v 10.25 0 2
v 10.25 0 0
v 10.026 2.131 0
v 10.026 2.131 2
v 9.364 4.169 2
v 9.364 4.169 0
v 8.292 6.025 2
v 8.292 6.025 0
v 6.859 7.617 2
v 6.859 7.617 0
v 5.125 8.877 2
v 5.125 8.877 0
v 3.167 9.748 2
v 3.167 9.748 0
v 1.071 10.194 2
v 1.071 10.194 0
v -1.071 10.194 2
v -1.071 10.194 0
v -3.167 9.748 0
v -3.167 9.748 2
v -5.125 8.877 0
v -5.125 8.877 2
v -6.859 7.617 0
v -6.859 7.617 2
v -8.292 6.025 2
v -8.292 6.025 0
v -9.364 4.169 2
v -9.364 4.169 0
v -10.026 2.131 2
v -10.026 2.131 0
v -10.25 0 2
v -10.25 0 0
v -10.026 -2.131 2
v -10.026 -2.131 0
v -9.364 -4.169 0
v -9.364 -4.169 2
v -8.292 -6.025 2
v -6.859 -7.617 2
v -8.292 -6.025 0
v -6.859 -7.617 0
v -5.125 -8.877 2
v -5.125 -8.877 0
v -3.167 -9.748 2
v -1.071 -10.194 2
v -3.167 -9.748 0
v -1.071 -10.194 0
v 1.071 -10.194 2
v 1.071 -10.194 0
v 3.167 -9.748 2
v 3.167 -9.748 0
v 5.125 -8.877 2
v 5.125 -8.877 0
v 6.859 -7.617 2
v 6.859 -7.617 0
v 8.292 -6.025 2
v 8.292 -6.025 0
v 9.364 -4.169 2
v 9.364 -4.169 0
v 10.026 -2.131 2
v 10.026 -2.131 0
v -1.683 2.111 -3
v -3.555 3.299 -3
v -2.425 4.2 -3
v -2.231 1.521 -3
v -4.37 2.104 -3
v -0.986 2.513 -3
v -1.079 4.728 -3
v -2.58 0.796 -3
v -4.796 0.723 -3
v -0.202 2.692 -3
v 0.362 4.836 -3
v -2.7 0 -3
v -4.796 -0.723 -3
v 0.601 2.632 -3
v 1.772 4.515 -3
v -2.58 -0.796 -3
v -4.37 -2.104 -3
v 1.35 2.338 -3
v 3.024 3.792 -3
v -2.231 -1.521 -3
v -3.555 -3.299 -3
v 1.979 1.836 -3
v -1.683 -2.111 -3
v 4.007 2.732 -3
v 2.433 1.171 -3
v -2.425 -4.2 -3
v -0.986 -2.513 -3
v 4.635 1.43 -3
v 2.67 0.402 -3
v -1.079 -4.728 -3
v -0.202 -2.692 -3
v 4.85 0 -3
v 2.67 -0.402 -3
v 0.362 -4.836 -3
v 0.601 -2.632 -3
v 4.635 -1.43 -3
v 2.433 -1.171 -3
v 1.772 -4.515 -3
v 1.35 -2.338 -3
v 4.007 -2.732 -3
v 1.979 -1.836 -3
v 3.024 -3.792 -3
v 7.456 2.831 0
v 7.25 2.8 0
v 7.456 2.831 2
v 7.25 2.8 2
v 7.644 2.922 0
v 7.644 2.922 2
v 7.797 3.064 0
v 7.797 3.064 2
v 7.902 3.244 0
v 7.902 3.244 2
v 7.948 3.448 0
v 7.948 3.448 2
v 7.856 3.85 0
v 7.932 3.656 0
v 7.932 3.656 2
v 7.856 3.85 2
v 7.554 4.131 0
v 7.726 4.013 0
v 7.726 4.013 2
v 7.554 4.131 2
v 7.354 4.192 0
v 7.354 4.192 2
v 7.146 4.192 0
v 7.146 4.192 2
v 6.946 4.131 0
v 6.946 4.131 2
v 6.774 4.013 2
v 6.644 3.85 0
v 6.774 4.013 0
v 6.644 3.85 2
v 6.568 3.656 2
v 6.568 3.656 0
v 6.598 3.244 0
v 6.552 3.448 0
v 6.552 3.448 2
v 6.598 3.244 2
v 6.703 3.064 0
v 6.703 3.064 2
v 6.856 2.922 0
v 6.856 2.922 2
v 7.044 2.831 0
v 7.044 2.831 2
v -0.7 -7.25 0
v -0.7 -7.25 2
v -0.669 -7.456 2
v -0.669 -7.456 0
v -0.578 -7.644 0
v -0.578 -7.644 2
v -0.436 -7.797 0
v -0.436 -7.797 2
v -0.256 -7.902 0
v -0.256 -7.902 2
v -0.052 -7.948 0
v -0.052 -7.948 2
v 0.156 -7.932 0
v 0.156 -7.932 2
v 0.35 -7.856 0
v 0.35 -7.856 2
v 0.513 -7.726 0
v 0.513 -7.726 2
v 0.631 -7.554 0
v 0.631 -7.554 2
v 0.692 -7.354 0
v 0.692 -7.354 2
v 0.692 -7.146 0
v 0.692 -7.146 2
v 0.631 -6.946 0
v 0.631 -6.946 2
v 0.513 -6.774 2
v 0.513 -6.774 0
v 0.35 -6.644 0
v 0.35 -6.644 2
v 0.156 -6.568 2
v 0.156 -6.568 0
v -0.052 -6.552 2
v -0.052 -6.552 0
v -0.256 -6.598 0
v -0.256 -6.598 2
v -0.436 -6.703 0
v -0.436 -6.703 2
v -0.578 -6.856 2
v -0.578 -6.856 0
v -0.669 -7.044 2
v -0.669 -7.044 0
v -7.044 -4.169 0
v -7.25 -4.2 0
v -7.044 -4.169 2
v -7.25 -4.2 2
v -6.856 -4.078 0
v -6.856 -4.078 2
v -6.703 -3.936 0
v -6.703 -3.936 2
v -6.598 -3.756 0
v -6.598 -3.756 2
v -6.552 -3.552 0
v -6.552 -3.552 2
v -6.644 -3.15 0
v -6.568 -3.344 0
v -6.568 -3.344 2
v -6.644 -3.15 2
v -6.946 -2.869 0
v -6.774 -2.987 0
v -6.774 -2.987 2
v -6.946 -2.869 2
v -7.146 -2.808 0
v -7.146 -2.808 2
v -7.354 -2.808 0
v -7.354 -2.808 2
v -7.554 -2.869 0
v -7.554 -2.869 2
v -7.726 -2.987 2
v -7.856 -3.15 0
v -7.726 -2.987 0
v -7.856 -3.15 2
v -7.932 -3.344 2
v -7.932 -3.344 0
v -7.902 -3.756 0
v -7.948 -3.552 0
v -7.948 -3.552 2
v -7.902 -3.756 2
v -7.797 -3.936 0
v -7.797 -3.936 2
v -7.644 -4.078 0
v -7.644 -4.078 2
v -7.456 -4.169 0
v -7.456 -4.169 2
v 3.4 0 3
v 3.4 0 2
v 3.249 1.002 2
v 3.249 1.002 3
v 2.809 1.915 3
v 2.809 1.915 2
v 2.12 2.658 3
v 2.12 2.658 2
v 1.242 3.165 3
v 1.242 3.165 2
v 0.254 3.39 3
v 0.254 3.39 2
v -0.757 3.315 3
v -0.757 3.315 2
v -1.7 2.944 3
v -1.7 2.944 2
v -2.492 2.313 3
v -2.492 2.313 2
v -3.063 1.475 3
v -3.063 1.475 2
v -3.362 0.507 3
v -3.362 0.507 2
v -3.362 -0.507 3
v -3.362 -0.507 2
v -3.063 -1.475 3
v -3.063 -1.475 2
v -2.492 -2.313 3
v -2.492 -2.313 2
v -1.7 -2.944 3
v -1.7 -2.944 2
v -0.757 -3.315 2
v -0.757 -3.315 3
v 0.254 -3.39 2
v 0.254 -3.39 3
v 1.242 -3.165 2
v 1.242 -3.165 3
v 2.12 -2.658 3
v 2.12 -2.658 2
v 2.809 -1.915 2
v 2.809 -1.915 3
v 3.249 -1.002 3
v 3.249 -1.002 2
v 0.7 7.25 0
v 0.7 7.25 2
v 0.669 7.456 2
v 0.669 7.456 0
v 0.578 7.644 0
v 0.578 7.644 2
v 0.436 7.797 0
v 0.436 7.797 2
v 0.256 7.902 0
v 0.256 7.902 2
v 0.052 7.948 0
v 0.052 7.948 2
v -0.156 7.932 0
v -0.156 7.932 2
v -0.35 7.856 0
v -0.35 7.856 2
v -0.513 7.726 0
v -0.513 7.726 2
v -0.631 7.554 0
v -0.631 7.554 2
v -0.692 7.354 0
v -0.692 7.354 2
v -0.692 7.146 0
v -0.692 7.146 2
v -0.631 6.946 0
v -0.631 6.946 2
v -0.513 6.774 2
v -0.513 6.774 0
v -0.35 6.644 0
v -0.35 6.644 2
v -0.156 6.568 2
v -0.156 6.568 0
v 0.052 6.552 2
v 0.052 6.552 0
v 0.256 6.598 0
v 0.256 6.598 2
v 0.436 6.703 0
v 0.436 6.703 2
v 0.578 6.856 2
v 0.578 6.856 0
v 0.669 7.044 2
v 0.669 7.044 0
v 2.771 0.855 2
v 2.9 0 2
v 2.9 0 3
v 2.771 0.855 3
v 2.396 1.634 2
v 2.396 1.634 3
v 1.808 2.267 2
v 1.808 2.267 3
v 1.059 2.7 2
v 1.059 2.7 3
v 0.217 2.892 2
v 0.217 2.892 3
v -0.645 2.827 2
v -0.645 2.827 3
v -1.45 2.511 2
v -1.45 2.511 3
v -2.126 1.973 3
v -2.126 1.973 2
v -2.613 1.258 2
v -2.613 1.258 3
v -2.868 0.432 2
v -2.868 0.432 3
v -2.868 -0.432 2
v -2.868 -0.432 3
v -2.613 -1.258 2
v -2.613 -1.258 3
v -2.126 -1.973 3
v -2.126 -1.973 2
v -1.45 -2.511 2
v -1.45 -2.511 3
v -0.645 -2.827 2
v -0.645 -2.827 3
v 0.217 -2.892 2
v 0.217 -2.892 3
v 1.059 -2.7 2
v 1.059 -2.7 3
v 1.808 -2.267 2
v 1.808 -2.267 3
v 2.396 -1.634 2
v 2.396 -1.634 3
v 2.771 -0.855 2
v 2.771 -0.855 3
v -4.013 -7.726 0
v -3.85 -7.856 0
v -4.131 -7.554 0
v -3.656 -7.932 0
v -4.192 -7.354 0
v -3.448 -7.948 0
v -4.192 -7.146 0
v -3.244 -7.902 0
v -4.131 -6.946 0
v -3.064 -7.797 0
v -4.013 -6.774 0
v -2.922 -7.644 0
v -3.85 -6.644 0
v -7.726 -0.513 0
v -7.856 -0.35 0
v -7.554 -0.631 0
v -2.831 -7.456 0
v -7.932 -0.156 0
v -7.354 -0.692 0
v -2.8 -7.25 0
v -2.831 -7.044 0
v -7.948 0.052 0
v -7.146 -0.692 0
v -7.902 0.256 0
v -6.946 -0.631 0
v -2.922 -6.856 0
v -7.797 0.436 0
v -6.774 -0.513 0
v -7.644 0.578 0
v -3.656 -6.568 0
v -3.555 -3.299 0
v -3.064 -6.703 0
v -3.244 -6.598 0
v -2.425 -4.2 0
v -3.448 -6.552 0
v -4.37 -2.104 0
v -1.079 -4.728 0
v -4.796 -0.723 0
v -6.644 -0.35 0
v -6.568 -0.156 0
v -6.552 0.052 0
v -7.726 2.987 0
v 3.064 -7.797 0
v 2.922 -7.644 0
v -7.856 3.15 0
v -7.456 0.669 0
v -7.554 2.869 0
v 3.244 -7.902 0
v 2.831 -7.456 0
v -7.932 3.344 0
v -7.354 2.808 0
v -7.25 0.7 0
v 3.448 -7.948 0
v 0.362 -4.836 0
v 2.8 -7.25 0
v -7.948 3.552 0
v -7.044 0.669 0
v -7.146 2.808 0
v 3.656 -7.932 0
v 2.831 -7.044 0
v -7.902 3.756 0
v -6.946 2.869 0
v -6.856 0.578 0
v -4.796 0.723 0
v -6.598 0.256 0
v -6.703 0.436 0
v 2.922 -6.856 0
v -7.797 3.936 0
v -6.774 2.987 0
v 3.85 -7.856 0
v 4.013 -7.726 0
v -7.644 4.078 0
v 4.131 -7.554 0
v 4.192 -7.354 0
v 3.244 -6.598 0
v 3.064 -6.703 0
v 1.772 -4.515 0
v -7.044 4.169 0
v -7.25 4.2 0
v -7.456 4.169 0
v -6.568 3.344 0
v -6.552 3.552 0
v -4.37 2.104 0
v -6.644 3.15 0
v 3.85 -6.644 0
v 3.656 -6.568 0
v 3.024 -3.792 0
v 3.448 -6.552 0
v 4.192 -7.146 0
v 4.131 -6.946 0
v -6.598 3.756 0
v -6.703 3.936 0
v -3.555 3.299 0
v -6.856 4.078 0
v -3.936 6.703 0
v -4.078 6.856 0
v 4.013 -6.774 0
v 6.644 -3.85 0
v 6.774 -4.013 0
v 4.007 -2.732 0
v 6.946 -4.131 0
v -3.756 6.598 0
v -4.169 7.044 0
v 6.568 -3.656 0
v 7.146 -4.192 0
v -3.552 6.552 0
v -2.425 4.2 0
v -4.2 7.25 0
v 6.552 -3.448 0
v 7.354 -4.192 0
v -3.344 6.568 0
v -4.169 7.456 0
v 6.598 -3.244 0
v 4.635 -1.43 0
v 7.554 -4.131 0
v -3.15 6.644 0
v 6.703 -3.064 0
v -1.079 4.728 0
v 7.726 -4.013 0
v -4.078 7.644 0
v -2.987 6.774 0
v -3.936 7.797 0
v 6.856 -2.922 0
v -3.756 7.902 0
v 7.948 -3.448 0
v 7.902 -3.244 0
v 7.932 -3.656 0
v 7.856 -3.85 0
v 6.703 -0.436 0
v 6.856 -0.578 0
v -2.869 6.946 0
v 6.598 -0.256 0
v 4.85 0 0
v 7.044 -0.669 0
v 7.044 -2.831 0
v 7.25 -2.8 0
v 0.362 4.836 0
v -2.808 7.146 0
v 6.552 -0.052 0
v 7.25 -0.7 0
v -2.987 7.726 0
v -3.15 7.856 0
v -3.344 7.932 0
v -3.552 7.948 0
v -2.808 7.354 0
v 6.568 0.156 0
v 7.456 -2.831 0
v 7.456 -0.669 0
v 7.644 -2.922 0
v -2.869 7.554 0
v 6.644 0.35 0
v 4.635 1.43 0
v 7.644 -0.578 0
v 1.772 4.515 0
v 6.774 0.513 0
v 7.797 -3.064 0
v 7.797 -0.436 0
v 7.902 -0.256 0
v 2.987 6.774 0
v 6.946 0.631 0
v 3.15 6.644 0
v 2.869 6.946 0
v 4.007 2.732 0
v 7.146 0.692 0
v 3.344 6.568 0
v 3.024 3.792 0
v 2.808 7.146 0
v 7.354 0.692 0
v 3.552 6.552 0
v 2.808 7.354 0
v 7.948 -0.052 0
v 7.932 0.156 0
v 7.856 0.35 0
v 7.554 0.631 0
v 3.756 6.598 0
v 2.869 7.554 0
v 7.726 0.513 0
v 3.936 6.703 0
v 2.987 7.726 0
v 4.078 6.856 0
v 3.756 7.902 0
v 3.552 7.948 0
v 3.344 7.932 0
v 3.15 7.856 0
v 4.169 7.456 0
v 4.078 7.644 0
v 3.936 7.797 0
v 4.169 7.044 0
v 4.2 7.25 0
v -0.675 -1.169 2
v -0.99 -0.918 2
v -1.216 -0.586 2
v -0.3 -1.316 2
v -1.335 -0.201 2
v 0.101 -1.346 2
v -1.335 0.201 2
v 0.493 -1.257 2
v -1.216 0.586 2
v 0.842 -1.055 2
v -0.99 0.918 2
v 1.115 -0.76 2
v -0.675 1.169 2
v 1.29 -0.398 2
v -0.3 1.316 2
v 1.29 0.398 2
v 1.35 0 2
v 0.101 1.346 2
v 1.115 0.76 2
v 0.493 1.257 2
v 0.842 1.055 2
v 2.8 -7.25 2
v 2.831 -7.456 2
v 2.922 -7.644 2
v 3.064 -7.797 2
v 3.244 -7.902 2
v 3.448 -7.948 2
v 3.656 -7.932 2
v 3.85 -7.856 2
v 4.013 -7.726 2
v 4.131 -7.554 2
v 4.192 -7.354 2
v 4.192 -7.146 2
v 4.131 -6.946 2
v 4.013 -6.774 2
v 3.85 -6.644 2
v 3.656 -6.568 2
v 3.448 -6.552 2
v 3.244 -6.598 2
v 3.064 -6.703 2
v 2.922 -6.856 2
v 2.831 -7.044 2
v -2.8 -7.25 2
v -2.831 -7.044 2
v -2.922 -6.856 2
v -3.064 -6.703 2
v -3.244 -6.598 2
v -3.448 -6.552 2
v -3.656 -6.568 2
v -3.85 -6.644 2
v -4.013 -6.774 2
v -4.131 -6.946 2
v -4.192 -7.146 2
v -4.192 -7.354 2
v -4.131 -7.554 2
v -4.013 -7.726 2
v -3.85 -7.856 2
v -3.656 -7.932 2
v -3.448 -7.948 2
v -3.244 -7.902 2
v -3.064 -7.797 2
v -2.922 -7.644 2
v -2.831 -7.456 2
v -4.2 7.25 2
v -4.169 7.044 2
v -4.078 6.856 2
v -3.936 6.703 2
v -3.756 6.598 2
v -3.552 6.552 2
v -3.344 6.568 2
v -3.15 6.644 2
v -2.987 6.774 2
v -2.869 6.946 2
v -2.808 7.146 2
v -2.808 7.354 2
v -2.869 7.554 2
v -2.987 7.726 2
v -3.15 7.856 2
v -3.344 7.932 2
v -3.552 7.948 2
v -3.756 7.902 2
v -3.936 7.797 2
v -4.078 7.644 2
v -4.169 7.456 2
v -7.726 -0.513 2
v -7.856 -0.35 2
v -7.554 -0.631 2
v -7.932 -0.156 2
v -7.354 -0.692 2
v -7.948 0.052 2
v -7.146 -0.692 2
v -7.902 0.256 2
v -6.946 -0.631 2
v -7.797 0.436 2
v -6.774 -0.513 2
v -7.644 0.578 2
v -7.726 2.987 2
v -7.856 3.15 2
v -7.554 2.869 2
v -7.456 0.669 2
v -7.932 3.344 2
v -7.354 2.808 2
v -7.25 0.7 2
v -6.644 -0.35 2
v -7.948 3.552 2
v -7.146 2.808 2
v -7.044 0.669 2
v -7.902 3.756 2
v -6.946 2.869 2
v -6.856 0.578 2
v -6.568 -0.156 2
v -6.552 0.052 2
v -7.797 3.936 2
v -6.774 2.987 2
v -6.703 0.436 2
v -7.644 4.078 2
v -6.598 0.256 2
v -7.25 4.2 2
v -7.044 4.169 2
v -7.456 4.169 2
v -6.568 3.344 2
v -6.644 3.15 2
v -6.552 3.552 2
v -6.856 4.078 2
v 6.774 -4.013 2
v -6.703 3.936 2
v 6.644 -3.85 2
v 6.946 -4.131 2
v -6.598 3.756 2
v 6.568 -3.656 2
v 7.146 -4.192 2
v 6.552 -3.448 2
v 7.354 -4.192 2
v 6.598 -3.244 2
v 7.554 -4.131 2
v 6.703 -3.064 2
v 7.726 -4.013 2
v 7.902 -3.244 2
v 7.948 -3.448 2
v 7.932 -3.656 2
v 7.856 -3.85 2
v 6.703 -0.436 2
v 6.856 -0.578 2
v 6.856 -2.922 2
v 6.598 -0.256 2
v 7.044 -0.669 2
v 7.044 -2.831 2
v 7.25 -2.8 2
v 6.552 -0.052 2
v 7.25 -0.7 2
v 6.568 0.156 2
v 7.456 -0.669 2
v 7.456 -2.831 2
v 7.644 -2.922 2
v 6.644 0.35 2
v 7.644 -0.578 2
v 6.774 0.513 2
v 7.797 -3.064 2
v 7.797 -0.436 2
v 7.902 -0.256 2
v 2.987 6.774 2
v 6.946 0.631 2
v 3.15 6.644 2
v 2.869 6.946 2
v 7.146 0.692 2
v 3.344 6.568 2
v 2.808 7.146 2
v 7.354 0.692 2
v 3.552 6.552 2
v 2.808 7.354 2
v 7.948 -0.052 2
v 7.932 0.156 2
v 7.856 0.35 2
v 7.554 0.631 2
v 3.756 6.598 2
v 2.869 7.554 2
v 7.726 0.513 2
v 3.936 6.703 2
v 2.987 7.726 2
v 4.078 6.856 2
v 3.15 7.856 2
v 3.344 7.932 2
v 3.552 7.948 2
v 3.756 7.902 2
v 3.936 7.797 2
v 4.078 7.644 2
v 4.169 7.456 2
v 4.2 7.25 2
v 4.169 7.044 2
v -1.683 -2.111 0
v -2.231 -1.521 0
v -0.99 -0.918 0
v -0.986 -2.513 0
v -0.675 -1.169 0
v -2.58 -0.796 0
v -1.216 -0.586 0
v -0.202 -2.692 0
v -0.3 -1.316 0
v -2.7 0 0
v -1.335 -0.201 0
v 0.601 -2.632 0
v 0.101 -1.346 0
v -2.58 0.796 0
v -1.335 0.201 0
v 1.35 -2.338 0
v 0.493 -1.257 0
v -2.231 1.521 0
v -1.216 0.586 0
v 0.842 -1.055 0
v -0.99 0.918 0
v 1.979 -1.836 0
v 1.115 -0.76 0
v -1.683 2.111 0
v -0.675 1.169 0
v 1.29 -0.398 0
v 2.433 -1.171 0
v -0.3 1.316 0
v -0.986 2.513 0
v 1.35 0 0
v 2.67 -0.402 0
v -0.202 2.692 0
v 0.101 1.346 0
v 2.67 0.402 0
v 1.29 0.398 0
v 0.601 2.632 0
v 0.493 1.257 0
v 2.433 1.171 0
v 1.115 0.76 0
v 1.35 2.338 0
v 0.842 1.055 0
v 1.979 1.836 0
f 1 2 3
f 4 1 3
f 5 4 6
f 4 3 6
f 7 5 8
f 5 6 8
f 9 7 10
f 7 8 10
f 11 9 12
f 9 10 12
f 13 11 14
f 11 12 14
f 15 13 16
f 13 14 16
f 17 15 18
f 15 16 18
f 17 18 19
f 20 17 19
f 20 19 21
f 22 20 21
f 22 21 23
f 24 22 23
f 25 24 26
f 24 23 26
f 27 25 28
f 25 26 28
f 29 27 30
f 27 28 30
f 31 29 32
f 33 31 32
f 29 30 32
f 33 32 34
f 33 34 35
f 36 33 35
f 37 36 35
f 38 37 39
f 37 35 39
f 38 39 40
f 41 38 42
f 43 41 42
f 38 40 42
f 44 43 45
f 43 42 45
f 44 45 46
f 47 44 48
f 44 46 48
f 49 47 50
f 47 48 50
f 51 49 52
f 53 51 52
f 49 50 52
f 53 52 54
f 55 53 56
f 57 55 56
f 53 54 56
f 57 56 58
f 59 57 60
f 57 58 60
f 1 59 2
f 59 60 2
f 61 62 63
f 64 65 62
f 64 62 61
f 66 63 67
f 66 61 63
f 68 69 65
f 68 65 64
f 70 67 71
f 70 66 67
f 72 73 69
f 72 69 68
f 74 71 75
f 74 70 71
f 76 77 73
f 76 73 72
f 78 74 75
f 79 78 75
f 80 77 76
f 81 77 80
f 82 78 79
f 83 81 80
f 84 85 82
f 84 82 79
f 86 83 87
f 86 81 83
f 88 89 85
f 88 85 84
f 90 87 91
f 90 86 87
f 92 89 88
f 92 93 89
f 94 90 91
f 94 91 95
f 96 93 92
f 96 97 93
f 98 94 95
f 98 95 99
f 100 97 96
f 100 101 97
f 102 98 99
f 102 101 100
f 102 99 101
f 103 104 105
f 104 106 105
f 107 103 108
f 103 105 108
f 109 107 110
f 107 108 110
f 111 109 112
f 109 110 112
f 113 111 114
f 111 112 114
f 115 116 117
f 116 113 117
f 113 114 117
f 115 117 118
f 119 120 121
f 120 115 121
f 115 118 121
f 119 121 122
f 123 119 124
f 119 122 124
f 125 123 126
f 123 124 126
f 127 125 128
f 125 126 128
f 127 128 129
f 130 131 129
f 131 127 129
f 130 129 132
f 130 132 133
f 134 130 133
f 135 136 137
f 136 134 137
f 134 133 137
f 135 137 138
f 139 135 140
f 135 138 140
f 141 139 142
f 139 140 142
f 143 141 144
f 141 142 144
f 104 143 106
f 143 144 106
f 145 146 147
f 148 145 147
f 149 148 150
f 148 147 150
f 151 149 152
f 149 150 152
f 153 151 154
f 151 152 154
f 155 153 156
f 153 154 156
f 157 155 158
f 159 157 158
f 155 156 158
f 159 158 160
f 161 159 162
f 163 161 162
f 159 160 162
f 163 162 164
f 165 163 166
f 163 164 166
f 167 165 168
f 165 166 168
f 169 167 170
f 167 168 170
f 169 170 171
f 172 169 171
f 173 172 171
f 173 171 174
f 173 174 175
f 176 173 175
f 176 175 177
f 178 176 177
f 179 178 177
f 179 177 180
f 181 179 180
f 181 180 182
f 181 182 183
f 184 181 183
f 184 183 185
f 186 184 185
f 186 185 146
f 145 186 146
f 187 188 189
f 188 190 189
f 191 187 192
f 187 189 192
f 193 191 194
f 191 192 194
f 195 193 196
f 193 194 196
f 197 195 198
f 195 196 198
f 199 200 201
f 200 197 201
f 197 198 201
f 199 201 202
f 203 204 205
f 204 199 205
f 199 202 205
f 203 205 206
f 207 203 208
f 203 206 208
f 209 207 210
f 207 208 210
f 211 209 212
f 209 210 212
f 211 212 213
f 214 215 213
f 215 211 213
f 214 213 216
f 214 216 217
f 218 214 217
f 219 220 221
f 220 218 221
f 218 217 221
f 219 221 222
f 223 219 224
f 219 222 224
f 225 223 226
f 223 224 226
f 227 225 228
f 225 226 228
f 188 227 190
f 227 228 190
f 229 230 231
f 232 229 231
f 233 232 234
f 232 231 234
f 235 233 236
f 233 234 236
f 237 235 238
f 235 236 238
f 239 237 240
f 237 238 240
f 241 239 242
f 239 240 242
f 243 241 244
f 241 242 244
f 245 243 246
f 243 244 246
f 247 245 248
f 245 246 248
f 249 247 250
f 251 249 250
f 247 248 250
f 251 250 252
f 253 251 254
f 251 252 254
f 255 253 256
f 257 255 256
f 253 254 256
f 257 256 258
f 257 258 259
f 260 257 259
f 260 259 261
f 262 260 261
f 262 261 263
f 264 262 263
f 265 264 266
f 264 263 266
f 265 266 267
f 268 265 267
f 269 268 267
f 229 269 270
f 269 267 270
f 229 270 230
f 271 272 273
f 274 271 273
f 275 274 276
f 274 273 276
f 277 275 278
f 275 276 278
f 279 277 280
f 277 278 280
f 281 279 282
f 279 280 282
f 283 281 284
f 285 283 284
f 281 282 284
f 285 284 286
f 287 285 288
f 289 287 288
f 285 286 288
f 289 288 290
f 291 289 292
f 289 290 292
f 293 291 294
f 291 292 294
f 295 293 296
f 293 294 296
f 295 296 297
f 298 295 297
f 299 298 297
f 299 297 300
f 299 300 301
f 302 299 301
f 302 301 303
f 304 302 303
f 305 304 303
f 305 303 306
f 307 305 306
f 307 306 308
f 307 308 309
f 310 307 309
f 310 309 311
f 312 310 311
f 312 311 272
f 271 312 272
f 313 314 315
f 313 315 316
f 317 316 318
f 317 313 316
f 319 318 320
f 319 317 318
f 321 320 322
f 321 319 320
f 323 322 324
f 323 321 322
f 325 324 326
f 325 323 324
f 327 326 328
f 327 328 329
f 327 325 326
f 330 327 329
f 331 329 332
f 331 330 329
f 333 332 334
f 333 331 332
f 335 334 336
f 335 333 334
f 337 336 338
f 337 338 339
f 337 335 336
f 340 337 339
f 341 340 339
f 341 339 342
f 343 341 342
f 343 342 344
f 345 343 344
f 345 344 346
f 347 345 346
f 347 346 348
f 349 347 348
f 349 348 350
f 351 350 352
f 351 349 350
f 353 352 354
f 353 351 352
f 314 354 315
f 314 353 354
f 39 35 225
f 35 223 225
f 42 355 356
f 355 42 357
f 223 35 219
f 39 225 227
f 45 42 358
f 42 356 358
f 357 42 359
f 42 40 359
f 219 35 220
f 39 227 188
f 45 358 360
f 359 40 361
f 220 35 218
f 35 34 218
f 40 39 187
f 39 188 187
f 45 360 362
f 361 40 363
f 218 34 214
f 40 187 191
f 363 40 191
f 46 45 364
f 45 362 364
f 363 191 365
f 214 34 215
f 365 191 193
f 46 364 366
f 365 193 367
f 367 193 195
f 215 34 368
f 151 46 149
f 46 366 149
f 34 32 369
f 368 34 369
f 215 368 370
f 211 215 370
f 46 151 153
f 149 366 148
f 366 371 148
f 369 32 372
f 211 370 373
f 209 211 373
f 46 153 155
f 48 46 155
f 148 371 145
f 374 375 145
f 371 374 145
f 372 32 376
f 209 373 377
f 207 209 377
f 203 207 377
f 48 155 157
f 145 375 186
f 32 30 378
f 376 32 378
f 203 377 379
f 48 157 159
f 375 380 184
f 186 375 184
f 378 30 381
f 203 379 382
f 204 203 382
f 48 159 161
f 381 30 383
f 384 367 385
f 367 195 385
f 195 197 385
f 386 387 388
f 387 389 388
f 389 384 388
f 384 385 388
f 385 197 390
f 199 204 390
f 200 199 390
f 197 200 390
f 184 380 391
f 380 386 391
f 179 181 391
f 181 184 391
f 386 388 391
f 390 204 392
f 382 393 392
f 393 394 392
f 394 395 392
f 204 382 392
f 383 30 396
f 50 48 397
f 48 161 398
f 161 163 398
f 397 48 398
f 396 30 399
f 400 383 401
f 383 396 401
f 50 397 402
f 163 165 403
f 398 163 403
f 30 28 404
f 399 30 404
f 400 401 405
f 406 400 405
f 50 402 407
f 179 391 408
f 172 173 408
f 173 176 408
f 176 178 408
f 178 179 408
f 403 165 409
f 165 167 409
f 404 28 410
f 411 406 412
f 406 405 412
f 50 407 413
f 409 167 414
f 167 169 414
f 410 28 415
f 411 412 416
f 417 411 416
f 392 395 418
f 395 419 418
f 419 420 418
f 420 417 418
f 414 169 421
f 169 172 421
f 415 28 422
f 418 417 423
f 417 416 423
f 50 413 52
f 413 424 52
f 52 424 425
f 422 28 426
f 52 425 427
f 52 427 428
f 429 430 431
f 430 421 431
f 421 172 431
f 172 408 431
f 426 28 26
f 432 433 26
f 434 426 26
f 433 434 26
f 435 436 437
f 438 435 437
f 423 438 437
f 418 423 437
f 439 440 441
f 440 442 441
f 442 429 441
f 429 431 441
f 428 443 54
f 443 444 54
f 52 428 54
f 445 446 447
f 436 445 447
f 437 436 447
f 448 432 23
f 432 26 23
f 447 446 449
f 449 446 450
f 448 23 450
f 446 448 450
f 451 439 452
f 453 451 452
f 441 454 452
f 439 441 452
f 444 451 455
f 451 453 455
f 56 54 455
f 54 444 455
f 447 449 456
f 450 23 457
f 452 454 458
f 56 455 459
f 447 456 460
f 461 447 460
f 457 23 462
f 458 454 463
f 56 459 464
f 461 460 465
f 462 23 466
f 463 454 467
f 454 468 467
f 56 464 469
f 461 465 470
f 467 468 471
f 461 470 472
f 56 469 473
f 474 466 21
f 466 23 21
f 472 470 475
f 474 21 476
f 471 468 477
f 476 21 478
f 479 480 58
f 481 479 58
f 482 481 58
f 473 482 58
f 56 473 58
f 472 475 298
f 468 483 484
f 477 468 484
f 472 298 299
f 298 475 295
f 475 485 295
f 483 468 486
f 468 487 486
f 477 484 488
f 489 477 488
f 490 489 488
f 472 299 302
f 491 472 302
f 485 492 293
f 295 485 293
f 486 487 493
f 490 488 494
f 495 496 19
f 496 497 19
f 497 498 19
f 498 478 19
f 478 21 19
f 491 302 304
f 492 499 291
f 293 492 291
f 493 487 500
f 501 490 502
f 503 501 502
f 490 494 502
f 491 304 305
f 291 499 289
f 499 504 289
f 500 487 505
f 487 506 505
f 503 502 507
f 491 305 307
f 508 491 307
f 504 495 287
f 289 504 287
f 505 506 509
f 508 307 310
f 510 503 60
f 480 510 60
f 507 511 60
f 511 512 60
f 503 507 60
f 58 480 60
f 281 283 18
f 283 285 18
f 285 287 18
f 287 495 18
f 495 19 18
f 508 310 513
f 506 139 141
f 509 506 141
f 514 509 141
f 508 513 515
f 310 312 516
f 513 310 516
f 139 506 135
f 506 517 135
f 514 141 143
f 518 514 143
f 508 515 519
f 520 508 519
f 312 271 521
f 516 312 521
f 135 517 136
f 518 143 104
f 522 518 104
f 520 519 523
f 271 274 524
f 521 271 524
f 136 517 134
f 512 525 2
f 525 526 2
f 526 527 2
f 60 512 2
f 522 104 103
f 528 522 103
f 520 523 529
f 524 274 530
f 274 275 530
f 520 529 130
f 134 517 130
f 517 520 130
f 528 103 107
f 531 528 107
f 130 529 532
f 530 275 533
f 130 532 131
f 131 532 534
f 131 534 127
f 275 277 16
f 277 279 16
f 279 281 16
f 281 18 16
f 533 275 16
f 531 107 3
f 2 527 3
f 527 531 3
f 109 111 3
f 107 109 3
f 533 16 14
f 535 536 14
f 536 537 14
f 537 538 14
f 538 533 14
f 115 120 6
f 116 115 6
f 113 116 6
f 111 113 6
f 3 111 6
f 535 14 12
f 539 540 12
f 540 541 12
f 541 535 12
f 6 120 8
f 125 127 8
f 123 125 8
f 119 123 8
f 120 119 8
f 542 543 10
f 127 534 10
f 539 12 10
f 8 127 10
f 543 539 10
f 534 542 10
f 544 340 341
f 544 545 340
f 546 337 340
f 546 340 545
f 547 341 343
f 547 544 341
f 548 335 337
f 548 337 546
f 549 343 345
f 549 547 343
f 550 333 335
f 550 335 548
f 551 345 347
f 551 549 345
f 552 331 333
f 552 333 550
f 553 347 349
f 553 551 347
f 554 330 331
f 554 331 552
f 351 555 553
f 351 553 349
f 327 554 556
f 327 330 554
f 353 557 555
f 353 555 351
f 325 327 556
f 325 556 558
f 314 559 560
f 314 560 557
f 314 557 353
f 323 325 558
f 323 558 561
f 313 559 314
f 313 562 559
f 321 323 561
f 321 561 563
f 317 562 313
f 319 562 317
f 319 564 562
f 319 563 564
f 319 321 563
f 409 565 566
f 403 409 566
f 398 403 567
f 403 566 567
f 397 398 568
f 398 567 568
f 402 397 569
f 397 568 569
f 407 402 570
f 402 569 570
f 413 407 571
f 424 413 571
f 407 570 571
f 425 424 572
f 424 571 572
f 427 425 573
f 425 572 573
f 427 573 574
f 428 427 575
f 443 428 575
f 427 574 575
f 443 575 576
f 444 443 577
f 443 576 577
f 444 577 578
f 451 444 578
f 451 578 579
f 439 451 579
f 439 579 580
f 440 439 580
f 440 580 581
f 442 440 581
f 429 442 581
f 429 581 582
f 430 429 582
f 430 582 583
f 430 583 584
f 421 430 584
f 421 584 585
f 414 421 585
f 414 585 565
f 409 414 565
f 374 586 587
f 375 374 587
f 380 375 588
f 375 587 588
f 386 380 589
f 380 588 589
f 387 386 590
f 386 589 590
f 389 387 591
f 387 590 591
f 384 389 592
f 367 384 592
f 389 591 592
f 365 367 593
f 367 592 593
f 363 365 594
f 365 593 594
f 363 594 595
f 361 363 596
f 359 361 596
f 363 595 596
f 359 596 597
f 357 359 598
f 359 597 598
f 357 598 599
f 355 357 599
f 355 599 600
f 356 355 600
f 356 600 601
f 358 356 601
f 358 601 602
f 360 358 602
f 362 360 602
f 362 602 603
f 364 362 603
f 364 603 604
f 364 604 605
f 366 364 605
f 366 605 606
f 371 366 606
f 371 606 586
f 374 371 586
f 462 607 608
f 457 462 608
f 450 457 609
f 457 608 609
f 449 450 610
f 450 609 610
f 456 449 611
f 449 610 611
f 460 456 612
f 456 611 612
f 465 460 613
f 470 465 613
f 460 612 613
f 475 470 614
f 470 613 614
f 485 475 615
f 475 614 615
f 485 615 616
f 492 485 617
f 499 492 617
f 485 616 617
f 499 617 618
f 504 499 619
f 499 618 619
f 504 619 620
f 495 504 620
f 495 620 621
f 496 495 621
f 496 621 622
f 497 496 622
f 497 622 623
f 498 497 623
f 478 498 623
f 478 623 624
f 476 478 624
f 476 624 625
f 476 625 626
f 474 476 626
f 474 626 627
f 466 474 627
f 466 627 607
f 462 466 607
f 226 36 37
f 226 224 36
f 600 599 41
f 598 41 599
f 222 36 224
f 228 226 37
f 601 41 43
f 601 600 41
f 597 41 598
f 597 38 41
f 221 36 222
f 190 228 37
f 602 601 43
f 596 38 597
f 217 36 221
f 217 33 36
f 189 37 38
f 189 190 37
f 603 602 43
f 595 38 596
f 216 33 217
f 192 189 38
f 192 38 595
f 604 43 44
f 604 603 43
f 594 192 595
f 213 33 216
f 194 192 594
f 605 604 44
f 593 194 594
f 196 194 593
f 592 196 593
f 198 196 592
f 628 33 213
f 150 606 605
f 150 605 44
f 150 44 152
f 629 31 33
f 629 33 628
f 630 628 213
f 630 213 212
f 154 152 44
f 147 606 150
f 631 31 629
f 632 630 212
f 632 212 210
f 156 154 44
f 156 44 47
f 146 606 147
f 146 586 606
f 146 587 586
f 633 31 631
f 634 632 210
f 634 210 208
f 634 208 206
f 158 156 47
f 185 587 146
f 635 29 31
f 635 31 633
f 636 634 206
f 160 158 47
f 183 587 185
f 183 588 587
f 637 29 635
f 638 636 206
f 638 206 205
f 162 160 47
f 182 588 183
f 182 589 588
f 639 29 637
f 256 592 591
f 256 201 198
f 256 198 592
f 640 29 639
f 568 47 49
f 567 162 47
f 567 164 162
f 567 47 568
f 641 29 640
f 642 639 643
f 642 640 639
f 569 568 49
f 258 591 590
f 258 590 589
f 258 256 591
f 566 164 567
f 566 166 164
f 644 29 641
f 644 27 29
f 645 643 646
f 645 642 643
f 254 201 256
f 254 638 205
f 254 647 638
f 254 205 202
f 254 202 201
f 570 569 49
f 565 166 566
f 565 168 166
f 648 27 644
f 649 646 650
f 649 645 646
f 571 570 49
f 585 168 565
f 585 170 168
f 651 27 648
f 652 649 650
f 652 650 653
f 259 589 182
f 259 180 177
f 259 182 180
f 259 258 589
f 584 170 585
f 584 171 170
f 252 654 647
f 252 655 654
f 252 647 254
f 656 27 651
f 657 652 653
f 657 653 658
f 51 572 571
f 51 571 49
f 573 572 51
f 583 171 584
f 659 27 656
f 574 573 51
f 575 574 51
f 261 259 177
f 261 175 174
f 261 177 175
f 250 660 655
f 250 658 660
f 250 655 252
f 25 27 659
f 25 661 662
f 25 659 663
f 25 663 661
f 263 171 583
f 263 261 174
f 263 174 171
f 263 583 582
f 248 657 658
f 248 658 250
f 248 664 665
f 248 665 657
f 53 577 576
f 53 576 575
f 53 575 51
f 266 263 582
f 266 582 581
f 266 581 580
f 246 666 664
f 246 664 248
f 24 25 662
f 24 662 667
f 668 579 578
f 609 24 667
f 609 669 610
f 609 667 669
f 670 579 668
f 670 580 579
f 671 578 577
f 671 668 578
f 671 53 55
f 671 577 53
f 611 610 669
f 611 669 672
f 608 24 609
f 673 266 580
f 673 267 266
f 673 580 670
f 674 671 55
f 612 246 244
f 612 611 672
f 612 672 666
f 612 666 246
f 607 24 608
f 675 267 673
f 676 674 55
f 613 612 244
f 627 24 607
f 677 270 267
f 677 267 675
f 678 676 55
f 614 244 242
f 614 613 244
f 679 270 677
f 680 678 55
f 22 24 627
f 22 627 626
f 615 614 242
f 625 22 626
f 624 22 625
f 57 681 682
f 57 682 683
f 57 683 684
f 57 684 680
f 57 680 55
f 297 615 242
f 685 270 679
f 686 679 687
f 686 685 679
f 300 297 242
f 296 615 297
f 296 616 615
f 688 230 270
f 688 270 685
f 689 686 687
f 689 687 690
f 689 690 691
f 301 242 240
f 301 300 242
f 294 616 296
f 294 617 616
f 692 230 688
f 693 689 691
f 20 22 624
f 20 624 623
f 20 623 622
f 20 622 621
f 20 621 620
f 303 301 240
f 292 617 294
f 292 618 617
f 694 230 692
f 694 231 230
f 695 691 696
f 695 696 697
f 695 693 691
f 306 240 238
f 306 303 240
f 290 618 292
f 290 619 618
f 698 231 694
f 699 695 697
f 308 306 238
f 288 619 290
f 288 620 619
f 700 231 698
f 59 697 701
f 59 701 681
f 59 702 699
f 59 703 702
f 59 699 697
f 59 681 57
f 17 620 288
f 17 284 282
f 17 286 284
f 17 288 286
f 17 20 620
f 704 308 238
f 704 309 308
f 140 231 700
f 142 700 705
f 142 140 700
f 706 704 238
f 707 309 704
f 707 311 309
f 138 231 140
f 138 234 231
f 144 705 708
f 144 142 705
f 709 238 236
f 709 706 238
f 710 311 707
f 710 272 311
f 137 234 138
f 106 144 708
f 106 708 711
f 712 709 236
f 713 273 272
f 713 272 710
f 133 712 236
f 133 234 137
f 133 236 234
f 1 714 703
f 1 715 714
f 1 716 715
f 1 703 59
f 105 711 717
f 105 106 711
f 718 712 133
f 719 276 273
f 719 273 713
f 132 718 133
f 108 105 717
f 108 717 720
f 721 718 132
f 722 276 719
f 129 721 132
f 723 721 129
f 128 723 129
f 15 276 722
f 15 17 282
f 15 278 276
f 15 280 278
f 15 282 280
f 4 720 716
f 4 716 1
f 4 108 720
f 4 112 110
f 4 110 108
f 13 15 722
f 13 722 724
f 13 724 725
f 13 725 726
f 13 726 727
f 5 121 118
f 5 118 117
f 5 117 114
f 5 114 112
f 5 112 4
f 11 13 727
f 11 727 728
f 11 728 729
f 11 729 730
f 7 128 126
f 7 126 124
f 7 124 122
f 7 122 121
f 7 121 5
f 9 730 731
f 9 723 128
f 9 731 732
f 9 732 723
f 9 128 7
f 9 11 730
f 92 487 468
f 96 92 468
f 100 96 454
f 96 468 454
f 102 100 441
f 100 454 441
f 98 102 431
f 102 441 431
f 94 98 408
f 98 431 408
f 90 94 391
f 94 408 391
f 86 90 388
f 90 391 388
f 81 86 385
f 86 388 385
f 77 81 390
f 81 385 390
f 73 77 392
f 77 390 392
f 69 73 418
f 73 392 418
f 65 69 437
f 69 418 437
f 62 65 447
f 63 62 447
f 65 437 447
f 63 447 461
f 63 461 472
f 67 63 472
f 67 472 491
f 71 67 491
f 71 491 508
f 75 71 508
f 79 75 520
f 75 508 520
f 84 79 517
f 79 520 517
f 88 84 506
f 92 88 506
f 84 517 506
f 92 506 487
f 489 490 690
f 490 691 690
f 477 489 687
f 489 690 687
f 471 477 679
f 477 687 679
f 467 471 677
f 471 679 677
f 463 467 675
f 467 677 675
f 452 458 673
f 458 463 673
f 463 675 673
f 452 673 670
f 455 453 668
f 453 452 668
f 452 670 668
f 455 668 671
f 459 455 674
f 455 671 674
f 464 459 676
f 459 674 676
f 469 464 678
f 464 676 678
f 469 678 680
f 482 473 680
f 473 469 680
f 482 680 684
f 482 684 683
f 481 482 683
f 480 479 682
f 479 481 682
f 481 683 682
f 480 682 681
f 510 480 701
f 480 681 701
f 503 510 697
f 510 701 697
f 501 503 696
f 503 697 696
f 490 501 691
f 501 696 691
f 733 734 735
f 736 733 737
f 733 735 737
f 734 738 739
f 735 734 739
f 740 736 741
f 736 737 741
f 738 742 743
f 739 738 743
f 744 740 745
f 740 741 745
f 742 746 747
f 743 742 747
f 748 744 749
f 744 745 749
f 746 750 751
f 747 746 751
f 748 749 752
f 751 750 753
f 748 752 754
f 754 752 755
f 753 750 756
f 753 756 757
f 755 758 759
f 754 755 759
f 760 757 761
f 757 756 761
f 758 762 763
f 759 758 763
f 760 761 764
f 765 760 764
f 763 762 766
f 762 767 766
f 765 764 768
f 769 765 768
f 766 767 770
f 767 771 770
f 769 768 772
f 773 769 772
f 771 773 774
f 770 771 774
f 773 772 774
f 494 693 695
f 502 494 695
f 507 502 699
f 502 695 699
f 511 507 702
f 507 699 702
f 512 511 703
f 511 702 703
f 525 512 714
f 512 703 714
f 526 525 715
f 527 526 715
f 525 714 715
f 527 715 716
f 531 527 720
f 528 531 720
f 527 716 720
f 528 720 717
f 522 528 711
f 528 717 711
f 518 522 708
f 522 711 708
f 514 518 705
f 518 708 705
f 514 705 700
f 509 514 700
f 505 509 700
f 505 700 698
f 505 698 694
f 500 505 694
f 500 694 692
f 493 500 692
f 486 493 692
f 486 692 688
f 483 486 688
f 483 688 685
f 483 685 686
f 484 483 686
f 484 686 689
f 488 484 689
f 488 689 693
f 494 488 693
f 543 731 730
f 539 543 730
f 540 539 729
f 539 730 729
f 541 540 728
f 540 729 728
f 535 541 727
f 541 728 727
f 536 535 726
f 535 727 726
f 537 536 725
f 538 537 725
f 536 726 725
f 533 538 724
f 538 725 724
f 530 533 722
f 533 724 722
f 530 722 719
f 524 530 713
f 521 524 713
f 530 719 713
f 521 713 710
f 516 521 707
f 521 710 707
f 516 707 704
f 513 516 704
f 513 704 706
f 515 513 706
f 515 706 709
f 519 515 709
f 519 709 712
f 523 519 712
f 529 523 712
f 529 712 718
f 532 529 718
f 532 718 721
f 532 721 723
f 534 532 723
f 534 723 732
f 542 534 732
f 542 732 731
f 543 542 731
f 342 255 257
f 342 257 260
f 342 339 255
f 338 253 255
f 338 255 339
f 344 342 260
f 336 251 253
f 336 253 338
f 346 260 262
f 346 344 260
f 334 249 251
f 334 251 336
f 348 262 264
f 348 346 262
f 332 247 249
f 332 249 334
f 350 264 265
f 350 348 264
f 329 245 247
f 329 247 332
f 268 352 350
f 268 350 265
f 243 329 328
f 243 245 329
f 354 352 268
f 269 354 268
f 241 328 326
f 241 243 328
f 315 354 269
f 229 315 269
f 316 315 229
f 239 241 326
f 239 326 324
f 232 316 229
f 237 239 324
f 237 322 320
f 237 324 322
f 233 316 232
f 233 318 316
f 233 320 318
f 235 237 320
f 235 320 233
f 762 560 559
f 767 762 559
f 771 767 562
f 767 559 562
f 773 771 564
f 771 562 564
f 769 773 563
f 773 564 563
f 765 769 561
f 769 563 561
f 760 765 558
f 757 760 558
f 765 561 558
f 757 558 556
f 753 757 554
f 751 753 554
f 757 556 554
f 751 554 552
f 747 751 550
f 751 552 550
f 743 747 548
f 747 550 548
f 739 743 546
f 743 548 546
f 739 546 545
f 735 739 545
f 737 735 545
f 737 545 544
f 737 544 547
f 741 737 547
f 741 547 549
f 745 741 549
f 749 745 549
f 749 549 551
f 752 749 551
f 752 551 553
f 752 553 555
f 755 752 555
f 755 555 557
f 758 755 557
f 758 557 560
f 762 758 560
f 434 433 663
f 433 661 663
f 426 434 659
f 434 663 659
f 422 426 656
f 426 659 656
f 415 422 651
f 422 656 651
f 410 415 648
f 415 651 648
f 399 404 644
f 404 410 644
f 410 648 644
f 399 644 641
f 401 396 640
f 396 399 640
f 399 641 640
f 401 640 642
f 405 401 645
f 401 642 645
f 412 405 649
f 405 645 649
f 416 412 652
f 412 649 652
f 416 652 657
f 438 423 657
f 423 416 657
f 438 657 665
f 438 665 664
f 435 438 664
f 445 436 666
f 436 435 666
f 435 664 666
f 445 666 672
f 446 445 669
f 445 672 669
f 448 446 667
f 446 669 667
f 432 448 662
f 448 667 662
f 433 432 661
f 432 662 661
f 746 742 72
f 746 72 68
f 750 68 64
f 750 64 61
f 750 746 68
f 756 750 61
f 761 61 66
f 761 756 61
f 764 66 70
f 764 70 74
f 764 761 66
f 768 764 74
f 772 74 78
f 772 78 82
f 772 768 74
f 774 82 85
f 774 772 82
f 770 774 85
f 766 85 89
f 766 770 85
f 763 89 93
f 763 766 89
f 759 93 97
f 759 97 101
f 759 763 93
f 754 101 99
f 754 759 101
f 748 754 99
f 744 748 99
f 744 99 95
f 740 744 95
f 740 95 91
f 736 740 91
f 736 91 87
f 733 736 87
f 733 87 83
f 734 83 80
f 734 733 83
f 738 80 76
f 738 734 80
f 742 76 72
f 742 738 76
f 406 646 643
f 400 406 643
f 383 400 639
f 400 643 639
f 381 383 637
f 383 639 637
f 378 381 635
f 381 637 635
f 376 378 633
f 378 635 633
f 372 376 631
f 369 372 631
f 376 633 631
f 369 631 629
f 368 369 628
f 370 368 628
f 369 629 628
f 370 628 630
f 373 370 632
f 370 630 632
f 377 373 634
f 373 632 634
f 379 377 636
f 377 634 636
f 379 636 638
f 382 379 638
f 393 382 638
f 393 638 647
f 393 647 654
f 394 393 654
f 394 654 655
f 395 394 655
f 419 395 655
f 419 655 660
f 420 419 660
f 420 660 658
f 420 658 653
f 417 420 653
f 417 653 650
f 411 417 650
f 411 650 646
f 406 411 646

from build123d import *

# Parameters (mm, degrees)
SKETCH1_R           = 10.25
BOSS_EXTRUDE1_DEPTH = 2
SKETCH2_R           = 3.4
SKETCH2_R_2         = 2.9
BOSS_EXTRUDE2_DEPTH = 1
SKETCH3_R           = 1.35
CUT_EXTRUDE1_DEPTH  = 15.633010627
SKETCH4_R           = 0.7
CUT_EXTRUDE2_DEPTH  = 15.633010627
CIRPATTERN1_COUNT   = 4
SKETCH5_R           = 4.85
SKETCH5_R_2         = 2.7
BOSS_EXTRUDE3_DEPTH = 3


with BuildPart() as part:
    # Sketch1 → Boss-Extrude1 (new body)
    with BuildSketch(Plane.XY):
        Circle(SKETCH1_R)
    extrude(amount=BOSS_EXTRUDE1_DEPTH)

    # Sketch2 → Boss-Extrude2 (add)
    with BuildSketch(Plane.XY.offset(2)):
        Circle(SKETCH2_R)
        Circle(SKETCH2_R_2, mode=Mode.SUBTRACT)
    extrude(amount=BOSS_EXTRUDE2_DEPTH)

    # Sketch3 → Cut-Extrude1 (cut, through all)
    with BuildSketch(Plane.XY.offset(2)):
        Circle(SKETCH3_R)
    extrude(amount=-CUT_EXTRUDE1_DEPTH, mode=Mode.SUBTRACT)

    # Sketch4 → Cut-Extrude2 (cut, through all)
    with BuildSketch(Plane.XY.offset(2)):
        with Locations((0, 7.25)):
            Circle(SKETCH4_R)
        with Locations((3.5, 7.25)):
            Circle(SKETCH4_R)
        with Locations(Location((-3.5, 7.25, 0), (0, 0, 180))):
            Circle(SKETCH4_R)
        with Locations((-3.5, -7.25)):
            Circle(SKETCH4_R)
        with Locations(Location((3.5, -7.25, 0), (0, 0, 180))):
            Circle(SKETCH4_R)
        with Locations(Location((0, -7.25, 0), (0, 0, 180))):
            Circle(SKETCH4_R)
    cut_extrude2 = extrude(amount=-CUT_EXTRUDE2_DEPTH, mode=Mode.SUBTRACT)

    # CirPattern1: Cut-Extrude2 ×4 about axis
    cirpattern1_axis = Axis((0, 0, 0), (0, 0, 1))
    for i in range(1, CIRPATTERN1_COUNT):
        add(cut_extrude2.rotate(cirpattern1_axis, i * 360 / CIRPATTERN1_COUNT), mode=Mode.SUBTRACT)

    # Sketch5 → Boss-Extrude3 (add)
    with BuildSketch(Plane(origin=(0, 0, 0), x_dir=(-1, 0, 0), z_dir=(0, 0, -1))):
        with Locations(Location((0, 0, 0), (0, 0, 180))):
            Circle(SKETCH5_R)
        Circle(SKETCH5_R_2, mode=Mode.SUBTRACT)
    extrude(amount=BOSS_EXTRUDE3_DEPTH)


solid = part.part
